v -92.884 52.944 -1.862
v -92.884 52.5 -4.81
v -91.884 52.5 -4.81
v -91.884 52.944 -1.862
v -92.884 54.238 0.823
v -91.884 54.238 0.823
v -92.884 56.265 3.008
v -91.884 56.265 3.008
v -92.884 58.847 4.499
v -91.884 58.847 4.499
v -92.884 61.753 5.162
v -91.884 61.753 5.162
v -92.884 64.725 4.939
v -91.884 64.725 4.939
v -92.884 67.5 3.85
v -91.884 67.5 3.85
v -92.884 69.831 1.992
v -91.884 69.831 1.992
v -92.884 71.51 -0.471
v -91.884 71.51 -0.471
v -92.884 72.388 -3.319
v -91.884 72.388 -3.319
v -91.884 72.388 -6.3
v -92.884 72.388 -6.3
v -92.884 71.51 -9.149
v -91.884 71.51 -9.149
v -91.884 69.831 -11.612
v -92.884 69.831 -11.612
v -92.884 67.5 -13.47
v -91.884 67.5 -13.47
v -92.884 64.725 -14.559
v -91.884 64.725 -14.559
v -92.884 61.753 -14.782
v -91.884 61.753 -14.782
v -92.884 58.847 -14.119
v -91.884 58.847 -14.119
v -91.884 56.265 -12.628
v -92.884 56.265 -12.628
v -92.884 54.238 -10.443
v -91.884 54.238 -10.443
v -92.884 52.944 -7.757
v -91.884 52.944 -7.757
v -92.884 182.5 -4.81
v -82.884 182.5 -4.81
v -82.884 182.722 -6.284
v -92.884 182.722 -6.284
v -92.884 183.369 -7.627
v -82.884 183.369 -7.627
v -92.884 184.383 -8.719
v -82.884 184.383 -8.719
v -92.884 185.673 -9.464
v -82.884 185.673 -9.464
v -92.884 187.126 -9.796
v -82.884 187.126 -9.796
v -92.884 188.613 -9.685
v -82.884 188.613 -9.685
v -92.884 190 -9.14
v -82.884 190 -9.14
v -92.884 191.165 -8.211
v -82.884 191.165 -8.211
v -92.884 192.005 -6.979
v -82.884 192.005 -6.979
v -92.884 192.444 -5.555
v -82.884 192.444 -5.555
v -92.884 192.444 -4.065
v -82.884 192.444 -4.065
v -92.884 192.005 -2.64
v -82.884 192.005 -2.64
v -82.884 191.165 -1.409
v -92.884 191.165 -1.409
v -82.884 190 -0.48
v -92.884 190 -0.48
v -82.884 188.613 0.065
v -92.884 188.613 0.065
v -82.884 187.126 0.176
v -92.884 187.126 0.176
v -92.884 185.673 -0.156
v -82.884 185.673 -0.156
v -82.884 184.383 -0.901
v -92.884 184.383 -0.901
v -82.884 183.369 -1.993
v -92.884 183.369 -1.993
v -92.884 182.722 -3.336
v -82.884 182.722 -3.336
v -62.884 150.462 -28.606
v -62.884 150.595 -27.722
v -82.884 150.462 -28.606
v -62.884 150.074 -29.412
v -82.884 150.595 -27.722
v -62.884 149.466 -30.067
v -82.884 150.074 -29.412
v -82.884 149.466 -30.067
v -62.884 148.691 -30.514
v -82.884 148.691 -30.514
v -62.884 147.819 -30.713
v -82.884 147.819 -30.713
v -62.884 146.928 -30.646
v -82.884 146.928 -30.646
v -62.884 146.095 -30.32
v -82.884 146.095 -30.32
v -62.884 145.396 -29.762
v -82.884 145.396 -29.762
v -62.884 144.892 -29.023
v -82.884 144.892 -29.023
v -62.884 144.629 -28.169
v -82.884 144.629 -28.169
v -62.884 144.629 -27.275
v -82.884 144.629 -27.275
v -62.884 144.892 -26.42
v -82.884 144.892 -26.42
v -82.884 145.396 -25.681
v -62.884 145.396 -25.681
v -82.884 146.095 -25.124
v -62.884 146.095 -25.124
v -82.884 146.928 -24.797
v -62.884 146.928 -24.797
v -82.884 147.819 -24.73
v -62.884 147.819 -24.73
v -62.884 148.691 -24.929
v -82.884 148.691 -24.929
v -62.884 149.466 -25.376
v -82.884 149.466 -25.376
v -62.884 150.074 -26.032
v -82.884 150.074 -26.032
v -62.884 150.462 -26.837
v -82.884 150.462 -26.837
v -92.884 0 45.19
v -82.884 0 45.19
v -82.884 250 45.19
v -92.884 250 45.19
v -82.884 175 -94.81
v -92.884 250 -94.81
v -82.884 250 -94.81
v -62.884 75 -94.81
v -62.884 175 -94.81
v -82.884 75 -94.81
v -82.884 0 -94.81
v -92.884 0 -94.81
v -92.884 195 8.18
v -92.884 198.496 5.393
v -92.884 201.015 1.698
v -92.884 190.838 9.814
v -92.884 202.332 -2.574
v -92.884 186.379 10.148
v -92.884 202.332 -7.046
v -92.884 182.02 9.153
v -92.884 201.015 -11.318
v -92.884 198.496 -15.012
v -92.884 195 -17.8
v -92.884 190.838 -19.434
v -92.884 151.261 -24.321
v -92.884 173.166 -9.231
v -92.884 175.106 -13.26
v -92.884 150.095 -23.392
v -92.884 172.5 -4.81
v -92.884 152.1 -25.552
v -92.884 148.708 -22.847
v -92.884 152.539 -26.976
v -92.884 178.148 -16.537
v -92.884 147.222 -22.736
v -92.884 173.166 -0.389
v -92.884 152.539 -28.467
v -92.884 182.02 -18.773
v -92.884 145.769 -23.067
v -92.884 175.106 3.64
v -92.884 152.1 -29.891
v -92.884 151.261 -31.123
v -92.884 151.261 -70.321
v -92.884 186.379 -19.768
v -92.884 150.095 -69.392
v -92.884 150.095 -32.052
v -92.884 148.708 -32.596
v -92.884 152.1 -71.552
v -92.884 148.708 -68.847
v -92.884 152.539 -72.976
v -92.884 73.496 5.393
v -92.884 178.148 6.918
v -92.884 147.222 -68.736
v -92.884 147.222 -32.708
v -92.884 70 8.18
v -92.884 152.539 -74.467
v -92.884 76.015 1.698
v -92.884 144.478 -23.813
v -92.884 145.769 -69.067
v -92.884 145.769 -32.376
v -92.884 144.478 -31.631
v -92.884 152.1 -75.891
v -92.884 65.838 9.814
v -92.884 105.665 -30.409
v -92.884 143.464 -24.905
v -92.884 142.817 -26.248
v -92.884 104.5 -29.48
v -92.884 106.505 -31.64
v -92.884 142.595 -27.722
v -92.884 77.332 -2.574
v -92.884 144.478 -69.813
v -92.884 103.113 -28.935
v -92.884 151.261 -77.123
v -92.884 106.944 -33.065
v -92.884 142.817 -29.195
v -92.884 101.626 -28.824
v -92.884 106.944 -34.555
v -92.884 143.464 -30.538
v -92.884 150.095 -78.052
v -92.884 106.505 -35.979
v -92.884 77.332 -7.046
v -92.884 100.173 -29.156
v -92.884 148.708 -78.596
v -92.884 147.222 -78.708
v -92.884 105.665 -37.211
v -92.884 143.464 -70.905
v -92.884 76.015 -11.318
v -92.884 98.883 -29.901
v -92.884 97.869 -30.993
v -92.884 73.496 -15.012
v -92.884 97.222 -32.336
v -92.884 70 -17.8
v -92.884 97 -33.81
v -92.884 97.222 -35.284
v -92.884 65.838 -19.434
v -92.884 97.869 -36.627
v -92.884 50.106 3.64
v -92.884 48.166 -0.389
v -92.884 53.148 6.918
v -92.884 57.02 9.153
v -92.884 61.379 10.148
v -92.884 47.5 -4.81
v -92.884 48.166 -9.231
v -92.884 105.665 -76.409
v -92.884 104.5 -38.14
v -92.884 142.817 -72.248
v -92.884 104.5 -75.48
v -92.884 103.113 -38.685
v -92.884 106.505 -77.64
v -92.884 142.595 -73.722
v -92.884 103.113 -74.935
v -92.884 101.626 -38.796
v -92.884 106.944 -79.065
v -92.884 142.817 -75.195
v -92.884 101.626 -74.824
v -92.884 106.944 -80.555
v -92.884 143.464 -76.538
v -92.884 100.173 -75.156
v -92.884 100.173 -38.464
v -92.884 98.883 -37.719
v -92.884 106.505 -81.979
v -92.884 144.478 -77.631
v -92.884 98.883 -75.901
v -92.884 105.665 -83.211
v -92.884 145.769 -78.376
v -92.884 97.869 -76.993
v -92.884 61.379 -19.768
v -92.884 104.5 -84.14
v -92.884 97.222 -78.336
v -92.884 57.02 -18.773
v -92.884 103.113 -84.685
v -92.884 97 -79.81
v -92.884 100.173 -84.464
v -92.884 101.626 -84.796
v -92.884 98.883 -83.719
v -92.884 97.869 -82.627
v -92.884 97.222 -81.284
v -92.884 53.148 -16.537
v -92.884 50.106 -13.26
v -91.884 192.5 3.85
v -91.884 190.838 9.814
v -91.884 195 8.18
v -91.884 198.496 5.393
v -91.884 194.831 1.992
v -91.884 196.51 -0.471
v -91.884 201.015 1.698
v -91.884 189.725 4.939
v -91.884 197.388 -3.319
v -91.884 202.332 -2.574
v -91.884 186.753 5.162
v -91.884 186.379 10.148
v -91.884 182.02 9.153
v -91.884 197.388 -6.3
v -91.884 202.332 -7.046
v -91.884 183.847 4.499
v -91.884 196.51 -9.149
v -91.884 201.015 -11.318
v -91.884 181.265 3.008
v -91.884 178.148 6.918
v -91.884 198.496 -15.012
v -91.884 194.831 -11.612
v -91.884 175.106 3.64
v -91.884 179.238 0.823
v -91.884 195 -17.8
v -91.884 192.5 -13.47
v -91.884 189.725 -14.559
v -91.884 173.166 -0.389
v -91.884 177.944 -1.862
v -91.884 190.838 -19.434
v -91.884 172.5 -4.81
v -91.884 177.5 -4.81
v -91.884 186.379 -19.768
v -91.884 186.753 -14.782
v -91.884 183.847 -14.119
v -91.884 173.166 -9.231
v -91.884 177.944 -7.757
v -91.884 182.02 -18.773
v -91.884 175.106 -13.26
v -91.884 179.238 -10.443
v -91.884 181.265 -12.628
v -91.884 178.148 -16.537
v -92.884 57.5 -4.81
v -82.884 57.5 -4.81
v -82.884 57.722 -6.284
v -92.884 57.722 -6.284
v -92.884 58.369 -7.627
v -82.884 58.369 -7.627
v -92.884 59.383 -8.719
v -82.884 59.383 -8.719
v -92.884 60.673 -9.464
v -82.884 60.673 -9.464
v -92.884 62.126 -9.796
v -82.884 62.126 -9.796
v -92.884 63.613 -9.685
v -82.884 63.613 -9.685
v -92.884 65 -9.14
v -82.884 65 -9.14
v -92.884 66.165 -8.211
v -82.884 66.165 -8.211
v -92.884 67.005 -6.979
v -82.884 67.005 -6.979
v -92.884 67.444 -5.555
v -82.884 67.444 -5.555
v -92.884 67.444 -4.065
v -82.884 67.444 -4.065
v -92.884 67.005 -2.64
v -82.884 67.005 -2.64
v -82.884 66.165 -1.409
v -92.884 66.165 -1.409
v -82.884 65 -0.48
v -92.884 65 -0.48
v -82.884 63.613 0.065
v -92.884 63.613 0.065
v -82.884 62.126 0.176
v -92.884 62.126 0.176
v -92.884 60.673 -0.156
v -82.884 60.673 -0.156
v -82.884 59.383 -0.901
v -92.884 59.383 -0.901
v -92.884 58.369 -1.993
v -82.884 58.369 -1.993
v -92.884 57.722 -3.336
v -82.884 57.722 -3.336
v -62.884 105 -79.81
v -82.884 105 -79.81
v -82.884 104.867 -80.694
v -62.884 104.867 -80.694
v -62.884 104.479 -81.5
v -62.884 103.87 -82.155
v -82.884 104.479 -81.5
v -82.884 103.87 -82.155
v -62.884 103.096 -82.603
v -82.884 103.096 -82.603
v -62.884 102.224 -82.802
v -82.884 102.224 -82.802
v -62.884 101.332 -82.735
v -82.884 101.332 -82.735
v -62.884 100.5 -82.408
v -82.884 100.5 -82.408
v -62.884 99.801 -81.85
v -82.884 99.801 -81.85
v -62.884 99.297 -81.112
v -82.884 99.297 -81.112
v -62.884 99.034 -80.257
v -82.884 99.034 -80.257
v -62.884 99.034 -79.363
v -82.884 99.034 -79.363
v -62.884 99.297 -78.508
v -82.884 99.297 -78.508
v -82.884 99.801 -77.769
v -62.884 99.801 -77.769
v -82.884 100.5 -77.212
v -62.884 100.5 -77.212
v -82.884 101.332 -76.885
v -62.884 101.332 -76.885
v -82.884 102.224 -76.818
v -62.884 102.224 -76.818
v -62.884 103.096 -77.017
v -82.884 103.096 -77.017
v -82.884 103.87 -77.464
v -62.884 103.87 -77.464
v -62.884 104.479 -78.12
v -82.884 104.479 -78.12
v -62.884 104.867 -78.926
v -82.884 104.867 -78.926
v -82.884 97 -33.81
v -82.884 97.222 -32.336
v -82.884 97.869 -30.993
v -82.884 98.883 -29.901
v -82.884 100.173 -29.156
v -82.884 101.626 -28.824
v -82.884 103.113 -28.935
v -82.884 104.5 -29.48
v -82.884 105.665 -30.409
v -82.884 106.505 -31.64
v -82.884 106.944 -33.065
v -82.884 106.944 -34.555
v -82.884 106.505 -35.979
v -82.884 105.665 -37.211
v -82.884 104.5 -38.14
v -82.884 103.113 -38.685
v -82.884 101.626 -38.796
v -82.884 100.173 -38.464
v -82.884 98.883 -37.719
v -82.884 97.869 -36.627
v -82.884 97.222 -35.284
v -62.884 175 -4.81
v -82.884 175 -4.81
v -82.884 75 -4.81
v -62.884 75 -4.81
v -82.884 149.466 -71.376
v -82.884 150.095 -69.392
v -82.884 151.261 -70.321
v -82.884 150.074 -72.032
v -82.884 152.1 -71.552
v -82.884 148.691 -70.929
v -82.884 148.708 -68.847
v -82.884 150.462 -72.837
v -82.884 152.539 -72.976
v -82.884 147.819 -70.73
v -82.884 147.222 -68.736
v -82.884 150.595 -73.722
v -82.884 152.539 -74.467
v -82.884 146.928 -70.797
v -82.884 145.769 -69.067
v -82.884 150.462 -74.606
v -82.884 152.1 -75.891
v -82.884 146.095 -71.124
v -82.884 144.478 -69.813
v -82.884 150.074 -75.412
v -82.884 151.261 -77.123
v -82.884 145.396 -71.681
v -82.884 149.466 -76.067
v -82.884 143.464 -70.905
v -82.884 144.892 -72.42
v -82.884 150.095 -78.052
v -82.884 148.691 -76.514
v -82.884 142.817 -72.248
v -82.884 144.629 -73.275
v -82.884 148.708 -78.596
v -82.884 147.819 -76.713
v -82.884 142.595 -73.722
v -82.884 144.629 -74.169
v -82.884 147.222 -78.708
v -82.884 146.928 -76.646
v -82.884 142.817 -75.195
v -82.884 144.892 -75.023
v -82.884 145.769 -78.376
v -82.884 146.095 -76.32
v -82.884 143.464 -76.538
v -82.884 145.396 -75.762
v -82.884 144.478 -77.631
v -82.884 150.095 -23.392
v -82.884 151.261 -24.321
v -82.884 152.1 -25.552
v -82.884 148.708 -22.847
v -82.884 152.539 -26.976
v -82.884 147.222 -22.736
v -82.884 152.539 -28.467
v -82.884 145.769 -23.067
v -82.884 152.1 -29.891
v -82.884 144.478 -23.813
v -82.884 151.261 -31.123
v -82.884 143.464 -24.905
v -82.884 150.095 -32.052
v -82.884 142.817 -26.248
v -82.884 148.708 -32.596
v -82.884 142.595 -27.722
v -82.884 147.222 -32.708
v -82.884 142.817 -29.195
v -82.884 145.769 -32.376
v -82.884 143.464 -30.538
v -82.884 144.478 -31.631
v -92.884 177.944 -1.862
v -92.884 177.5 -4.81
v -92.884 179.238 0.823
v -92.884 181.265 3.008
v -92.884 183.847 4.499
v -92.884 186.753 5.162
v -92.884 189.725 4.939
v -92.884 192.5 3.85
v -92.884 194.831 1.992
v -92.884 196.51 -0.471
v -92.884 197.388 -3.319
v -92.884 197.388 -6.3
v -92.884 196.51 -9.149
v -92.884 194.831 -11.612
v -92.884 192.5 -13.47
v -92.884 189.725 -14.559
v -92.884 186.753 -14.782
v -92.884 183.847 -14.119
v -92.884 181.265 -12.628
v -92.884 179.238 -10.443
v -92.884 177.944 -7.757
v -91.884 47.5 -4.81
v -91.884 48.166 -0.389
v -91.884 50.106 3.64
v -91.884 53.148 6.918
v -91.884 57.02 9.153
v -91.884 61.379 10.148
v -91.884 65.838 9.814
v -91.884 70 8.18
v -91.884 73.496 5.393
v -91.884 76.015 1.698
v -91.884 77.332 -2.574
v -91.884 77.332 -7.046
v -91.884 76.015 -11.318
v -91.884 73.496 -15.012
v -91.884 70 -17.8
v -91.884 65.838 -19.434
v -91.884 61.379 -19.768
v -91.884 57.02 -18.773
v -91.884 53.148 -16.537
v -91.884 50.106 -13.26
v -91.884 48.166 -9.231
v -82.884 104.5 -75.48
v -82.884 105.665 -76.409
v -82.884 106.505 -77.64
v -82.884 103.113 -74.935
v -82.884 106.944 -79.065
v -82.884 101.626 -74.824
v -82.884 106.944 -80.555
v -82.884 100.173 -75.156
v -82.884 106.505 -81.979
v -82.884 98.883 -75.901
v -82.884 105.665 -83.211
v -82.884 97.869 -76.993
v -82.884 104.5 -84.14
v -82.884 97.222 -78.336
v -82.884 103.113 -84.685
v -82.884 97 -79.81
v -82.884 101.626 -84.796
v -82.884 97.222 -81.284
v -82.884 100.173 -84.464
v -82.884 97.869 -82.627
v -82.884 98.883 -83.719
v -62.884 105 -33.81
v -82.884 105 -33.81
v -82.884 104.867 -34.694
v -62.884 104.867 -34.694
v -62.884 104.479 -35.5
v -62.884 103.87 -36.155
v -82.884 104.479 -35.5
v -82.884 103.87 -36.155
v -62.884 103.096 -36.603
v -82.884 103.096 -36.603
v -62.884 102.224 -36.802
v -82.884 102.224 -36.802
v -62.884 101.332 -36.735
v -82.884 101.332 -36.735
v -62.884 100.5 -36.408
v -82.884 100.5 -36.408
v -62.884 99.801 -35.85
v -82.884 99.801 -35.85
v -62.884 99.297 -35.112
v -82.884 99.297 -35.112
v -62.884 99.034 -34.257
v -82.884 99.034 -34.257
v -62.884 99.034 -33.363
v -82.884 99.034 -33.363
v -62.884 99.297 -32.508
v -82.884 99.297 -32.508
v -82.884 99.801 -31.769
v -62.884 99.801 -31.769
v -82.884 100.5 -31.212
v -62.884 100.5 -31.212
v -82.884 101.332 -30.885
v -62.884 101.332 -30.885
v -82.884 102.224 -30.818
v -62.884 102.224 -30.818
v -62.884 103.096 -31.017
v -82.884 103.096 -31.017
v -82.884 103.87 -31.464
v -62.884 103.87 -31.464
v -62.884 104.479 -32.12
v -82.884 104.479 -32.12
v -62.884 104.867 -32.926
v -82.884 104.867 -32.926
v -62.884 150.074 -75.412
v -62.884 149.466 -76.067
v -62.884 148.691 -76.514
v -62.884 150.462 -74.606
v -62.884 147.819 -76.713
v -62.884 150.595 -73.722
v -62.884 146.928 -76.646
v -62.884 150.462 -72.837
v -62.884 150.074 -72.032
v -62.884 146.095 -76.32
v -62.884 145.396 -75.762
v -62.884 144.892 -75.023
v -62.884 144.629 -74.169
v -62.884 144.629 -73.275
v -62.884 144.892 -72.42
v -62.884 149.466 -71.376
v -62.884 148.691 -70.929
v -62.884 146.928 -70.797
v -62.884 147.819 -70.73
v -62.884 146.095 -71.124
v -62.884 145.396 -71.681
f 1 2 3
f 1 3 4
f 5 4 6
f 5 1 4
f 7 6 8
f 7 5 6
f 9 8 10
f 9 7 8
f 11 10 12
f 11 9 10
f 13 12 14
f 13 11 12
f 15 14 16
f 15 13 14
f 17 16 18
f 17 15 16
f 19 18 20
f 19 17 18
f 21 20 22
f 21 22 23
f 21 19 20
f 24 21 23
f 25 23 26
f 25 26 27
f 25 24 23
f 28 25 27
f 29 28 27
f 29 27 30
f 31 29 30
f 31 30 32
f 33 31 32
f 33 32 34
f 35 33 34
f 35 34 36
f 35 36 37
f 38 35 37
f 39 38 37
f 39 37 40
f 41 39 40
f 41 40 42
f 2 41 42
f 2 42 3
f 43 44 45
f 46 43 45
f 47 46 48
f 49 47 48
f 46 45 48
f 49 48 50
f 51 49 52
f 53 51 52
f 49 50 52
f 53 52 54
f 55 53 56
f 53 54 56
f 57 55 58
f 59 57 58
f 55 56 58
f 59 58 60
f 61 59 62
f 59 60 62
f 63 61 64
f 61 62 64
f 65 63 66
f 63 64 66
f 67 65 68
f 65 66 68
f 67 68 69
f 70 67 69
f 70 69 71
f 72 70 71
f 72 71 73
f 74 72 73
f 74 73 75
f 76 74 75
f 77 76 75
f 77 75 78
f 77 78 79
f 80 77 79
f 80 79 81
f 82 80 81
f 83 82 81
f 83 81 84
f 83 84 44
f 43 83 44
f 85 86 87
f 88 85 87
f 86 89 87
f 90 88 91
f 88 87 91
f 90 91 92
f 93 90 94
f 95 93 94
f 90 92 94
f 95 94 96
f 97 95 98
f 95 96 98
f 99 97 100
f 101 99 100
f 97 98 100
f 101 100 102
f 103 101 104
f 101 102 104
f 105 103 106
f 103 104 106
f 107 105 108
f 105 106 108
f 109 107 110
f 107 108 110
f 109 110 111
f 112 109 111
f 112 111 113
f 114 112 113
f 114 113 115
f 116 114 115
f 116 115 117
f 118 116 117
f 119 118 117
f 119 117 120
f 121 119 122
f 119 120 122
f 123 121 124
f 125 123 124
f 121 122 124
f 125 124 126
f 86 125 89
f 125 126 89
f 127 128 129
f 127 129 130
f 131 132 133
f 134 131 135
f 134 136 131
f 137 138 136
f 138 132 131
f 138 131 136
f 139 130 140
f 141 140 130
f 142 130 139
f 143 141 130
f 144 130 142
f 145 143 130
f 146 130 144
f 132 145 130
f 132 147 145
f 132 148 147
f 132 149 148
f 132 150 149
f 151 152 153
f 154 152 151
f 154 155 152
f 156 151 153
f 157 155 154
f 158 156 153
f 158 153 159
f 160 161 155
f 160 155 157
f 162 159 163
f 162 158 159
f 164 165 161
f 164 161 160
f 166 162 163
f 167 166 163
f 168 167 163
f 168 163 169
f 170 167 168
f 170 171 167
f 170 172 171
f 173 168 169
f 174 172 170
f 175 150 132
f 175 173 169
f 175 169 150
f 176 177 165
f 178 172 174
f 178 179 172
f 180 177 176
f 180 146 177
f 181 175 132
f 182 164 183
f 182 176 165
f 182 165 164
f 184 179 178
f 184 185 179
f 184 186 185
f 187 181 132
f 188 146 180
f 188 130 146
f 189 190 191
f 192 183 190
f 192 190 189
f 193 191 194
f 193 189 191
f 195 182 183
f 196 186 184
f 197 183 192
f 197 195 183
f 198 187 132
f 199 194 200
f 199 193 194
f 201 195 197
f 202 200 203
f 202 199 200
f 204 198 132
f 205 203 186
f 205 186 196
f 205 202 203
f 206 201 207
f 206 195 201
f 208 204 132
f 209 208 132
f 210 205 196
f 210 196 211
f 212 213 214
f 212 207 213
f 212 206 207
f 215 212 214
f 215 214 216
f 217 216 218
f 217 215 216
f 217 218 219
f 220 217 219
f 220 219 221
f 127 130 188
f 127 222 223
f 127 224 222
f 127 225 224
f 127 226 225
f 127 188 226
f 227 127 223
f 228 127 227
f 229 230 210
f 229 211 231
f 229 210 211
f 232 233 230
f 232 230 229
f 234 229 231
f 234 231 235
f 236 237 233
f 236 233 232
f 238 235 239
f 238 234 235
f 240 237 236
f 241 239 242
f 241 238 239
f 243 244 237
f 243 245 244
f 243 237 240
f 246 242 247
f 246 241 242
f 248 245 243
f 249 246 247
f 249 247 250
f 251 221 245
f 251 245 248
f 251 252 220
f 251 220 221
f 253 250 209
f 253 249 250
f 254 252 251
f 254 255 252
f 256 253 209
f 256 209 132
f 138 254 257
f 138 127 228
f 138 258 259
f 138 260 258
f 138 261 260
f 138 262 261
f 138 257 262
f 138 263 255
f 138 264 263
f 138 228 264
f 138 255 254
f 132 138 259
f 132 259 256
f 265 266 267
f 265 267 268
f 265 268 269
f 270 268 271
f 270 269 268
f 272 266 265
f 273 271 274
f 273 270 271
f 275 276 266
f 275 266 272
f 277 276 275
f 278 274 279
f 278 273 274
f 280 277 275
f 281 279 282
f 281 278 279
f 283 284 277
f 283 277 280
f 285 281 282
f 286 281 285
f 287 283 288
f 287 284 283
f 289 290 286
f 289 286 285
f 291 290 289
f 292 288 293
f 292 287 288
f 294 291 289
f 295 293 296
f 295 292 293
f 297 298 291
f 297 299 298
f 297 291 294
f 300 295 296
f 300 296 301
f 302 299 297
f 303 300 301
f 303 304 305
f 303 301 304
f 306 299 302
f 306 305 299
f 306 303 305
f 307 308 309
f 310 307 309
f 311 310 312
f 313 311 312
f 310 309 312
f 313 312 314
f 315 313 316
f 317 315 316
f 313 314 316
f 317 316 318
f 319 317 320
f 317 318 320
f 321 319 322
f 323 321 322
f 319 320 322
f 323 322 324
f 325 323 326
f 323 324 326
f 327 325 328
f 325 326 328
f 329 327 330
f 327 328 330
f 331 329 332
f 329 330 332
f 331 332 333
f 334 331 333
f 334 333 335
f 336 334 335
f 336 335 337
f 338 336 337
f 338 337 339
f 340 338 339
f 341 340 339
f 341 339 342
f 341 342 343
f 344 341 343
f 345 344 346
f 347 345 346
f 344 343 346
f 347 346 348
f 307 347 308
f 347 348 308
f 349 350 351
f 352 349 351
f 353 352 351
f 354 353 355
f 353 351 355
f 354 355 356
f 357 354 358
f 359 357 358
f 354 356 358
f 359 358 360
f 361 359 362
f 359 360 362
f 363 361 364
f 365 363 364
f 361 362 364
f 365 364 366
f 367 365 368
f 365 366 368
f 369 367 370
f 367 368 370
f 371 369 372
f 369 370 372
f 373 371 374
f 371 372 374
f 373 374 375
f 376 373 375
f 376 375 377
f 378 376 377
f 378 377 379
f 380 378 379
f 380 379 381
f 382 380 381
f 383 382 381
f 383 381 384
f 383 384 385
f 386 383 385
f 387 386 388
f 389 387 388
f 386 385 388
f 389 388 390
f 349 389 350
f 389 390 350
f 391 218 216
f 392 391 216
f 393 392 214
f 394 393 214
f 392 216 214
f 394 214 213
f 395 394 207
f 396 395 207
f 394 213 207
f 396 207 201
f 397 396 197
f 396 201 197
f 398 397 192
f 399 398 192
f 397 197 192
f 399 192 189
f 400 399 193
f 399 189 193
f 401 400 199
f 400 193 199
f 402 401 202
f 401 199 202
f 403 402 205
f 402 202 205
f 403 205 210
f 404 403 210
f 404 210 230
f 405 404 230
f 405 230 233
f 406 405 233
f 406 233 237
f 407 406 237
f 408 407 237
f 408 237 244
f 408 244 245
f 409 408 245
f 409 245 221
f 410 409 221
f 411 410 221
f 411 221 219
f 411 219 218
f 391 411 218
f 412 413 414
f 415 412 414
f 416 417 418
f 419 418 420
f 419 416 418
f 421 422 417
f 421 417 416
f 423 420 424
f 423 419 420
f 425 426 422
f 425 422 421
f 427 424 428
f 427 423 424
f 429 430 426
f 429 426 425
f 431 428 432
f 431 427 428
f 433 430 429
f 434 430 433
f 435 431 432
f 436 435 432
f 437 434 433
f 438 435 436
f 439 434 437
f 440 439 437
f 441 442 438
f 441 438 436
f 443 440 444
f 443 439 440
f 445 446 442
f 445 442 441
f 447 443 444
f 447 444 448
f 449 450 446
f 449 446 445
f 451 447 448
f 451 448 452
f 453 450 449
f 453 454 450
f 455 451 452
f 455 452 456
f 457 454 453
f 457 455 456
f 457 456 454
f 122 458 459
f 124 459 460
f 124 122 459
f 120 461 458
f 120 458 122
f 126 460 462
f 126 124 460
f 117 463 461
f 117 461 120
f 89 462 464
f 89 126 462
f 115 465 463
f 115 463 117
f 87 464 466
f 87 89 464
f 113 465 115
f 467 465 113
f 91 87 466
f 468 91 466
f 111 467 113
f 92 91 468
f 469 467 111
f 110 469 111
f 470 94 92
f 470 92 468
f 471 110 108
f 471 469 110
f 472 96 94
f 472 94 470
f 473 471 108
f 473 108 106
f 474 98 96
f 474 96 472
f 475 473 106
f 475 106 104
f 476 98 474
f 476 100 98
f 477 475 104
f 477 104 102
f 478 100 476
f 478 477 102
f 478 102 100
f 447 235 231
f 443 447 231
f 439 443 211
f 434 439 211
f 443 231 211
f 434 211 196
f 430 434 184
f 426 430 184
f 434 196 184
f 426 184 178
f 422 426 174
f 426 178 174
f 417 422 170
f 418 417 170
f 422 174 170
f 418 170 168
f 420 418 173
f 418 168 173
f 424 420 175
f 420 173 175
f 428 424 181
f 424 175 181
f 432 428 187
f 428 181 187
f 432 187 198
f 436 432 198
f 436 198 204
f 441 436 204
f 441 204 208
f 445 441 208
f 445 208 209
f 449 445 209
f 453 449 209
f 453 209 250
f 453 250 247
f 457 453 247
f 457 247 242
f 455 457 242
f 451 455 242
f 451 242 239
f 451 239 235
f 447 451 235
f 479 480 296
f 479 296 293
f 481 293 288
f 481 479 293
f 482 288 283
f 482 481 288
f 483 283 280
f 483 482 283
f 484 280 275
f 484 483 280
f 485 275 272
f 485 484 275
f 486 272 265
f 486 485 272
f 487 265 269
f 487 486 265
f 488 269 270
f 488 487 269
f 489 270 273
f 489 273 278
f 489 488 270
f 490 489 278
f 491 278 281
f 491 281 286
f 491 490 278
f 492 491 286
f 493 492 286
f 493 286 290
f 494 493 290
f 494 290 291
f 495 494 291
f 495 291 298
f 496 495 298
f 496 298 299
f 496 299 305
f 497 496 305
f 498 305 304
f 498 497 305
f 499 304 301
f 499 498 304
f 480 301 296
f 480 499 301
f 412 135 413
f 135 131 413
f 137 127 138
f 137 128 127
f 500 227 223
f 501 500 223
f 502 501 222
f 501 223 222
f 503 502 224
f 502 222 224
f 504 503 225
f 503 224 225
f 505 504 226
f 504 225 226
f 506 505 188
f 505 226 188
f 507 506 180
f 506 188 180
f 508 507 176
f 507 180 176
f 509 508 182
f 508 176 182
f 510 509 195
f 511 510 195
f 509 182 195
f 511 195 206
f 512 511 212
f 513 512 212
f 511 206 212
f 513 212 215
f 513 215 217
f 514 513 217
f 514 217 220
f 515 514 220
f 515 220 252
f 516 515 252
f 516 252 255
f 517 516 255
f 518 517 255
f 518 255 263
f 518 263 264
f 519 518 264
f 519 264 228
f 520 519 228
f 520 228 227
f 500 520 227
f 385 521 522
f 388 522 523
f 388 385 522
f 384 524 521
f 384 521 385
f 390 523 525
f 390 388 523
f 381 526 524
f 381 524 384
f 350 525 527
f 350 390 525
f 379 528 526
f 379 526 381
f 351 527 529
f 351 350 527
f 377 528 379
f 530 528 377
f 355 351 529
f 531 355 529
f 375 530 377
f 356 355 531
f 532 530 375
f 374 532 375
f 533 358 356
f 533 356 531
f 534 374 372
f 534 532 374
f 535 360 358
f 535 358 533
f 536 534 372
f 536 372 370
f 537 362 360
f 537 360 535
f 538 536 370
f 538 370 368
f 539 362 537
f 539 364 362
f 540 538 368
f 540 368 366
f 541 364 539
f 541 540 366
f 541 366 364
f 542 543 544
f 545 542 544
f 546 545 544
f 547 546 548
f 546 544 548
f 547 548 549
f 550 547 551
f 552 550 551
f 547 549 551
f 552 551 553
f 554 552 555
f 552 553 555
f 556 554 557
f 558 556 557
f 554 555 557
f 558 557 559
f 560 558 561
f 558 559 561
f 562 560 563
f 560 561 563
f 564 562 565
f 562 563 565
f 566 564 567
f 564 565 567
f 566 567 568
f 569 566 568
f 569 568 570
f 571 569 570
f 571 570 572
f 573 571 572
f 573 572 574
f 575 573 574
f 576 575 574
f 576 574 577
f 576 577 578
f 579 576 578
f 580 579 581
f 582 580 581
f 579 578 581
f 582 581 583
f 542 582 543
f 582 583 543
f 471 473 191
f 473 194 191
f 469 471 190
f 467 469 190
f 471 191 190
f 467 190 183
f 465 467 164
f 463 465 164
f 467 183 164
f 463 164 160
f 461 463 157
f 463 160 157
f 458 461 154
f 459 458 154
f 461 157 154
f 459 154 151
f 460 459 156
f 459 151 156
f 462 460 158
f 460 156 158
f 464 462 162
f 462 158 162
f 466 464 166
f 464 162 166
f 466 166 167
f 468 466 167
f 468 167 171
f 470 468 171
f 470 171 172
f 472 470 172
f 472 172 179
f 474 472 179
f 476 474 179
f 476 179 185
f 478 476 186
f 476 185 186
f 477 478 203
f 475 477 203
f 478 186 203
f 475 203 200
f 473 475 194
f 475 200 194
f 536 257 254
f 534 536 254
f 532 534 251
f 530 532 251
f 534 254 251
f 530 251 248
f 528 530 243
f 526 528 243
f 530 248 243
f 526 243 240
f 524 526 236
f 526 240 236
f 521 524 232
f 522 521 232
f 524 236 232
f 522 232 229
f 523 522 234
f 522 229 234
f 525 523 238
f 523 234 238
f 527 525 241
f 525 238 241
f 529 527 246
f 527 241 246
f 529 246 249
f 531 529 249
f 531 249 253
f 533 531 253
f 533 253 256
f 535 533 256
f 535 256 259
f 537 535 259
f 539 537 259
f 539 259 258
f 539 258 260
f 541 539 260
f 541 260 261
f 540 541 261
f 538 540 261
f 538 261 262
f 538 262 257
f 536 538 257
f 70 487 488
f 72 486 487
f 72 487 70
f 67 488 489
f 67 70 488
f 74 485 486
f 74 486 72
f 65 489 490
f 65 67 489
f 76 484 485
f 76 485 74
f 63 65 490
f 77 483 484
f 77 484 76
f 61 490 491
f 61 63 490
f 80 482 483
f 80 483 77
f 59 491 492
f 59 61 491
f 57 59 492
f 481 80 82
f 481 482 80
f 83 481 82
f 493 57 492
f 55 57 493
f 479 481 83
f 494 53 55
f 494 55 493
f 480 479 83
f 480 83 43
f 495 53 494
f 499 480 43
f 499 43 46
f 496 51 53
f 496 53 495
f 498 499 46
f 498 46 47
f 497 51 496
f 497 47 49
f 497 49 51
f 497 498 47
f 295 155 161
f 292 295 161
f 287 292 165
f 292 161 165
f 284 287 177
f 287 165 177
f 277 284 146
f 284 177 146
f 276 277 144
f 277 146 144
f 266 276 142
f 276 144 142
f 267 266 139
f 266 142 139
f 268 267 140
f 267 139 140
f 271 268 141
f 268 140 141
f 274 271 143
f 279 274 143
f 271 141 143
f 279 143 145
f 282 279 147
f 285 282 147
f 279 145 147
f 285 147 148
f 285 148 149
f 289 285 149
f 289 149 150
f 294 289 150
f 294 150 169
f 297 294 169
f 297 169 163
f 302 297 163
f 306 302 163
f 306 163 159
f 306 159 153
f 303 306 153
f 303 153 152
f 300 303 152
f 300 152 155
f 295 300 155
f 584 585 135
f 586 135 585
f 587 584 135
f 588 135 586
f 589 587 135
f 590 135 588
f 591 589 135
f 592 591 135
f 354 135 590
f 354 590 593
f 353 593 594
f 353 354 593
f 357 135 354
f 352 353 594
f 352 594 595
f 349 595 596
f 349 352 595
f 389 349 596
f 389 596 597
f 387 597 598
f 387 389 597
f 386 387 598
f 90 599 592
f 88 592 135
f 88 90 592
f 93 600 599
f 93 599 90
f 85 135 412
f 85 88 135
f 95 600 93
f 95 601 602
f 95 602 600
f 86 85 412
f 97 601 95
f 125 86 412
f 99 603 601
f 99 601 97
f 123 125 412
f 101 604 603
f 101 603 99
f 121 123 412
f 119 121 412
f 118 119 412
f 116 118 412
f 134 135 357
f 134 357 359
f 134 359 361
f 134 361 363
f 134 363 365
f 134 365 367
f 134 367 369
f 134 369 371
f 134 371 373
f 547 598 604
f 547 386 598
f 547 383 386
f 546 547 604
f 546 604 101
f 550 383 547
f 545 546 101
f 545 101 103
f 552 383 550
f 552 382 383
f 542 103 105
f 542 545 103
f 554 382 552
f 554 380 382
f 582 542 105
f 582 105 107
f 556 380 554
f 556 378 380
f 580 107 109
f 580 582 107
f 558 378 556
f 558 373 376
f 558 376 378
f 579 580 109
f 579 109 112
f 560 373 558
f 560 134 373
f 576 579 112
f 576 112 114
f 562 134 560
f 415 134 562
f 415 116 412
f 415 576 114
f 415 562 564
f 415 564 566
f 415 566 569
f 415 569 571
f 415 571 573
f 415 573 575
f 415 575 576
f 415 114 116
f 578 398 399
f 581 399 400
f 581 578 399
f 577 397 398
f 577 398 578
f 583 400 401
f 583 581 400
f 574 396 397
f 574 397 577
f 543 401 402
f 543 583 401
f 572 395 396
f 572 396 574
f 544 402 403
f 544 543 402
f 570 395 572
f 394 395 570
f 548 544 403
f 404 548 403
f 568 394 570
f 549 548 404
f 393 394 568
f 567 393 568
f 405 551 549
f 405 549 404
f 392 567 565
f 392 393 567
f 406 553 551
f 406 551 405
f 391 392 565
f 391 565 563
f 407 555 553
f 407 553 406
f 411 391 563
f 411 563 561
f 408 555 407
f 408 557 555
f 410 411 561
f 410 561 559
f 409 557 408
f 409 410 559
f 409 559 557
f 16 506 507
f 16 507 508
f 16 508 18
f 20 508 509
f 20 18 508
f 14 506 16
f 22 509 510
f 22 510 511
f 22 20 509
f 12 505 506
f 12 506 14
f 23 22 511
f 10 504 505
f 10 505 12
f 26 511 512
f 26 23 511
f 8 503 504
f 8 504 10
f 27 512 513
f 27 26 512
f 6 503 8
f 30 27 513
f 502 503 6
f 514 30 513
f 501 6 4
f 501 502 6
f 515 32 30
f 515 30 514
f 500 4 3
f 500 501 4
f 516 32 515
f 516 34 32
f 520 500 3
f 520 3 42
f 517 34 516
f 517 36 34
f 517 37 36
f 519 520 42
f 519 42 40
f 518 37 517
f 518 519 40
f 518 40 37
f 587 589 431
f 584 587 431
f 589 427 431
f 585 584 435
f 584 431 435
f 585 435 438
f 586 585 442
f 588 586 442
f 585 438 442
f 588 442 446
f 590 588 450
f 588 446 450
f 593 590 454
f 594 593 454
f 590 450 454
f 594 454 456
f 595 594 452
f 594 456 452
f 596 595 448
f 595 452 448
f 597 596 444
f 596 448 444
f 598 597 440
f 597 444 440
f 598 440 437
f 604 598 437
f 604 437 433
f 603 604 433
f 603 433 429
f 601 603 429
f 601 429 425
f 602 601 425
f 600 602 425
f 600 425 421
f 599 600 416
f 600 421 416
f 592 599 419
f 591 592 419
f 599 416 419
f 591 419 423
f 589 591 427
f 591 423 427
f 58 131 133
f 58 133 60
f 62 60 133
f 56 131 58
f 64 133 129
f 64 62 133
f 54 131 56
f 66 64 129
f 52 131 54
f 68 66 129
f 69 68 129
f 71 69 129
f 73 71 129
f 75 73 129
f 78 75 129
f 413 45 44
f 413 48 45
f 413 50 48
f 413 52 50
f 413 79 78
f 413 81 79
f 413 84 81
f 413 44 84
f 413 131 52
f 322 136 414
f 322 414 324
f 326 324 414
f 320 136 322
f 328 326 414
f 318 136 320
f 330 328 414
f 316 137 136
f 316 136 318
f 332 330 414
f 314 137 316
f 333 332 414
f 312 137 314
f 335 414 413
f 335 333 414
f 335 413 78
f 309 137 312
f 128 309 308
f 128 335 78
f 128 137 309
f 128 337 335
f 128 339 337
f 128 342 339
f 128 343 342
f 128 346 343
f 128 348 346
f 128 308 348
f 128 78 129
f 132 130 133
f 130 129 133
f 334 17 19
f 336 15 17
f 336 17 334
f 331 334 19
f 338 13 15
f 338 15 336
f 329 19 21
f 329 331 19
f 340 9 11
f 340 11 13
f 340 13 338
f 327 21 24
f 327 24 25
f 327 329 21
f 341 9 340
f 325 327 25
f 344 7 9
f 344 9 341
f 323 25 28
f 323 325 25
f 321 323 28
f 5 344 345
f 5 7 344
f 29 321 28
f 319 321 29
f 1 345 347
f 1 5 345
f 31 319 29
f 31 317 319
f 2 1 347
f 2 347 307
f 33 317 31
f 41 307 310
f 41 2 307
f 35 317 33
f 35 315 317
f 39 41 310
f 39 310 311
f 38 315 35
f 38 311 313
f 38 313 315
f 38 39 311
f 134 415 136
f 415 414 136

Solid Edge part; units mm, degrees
sketch "Sketch1" plane through (0, 0, 0) normal (0, -1, 0) x (1, 0, 0)
  line L0 (-92.8835, -94.8099) -> (-82.8835, -94.8099)
  line L1 (-82.8835, -94.8099) -> (-82.8835, 45.1901)
  line L2 (-82.8835, 45.1901) -> (-92.8835, 45.1901)
  line L3 (-92.8835, 45.1901) -> (-92.8835, -94.8099)
  dimension "D1" = 10
  dimension "D2" = 140
extrude "Protrusion1" add sketch "Sketch1" against normal blind 250
sketch "Sketch2" plane through (-82.8835, 104, 0.1901) normal (1, 0, 0) x (0, -1, 0)
  line L0 (-71, 5) -> (29, 5)
  line L1 (29, 5) -> (29, 95)
  line L2 (29, 95) -> (-71, 95)
  line L3 (-71, 95) -> (-71, 5)
  dimension "D1" = 90
  dimension "D2" = 100
extrude "Protrusion2" add sketch "Sketch2" along normal blind 20
sketch "Sketch3" plane through (-82.8835, 100, 10.1901) normal (1, 0, 0) x (0, -1, 0)
  circle A0 centre (37.5, 15) radius 5
  circle A1 centre (-87.5, 15) radius 5
  dimension "D1" = 10
  dimension "D2" = 10
  dimension "D3" = 125
  dimension "D4" = 50
  dimension "D5" = 62.5
extrude "Cutout1" cut sketch "Sketch3" against normal through all
extrude "ExtrudedCutout_6" [suppressed]
sketch "Sketch4" plane through (-92.8835, 145.5, -4.8099) normal (-1, 0, 0) x (0, 1, 0)
  circle A0 centre (2.0953, 68.9118) radius 3
  circle A1 centre (2.0953, 22.9118) radius 3
  circle A2 centre (-43.5, 29) radius 3
  circle A3 centre (-43.5, 75) radius 3
  dimension "D1" = 45.5953
  dimension "D2" = 6
  dimension "D3" = 6
  dimension "D4" = 6
  dimension "D5" = 6
  dimension "D6" = 15
  dimension "D7" = 23
  dimension "D8" = 6.0882
  dimension "D9" = 6.0882
extrude "Cutout2" cut sketch "Sketch4" against normal through all
sketch "Sketch5" plane through (-92.8835, 145.5, 0.1901) normal (-1, 0, 0) x (0, -1, 0)
  circle A0 centre (-2.0953, -73.9118) radius 5
  circle A1 centre (43.5, -80) radius 5
  circle A2 centre (43.5, -34) radius 5
  circle A3 centre (-2.0953, -27.9118) radius 5
  dimension "D1" = 10
  dimension "D2" = 10
  dimension "D3" = 10
  dimension "D4" = 10
extrude "Cutout3" cut sketch "Sketch5" against normal up to vertex (10 mm away)
sketch "Sketch6" plane through (-92.8835, 104, -4.8099) normal (-1, 0, 0) x (0, -1, 0)
  circle A0 centre (41.5, 0) radius 15
  circle A1 centre (-83.5, 0) radius 10
  circle A2 centre (41.5, 0) radius 10
  circle A3 centre (-83.5, 0) radius 15
  dimension "D1" = 30
  dimension "D2" = 30
  dimension "D3" = 20
  dimension "D4" = 20
extrude "ExtrudedCutout_9" cut sketch "Sketch6" against normal blind 1
properties material "Aluminum, 6061-T6"
